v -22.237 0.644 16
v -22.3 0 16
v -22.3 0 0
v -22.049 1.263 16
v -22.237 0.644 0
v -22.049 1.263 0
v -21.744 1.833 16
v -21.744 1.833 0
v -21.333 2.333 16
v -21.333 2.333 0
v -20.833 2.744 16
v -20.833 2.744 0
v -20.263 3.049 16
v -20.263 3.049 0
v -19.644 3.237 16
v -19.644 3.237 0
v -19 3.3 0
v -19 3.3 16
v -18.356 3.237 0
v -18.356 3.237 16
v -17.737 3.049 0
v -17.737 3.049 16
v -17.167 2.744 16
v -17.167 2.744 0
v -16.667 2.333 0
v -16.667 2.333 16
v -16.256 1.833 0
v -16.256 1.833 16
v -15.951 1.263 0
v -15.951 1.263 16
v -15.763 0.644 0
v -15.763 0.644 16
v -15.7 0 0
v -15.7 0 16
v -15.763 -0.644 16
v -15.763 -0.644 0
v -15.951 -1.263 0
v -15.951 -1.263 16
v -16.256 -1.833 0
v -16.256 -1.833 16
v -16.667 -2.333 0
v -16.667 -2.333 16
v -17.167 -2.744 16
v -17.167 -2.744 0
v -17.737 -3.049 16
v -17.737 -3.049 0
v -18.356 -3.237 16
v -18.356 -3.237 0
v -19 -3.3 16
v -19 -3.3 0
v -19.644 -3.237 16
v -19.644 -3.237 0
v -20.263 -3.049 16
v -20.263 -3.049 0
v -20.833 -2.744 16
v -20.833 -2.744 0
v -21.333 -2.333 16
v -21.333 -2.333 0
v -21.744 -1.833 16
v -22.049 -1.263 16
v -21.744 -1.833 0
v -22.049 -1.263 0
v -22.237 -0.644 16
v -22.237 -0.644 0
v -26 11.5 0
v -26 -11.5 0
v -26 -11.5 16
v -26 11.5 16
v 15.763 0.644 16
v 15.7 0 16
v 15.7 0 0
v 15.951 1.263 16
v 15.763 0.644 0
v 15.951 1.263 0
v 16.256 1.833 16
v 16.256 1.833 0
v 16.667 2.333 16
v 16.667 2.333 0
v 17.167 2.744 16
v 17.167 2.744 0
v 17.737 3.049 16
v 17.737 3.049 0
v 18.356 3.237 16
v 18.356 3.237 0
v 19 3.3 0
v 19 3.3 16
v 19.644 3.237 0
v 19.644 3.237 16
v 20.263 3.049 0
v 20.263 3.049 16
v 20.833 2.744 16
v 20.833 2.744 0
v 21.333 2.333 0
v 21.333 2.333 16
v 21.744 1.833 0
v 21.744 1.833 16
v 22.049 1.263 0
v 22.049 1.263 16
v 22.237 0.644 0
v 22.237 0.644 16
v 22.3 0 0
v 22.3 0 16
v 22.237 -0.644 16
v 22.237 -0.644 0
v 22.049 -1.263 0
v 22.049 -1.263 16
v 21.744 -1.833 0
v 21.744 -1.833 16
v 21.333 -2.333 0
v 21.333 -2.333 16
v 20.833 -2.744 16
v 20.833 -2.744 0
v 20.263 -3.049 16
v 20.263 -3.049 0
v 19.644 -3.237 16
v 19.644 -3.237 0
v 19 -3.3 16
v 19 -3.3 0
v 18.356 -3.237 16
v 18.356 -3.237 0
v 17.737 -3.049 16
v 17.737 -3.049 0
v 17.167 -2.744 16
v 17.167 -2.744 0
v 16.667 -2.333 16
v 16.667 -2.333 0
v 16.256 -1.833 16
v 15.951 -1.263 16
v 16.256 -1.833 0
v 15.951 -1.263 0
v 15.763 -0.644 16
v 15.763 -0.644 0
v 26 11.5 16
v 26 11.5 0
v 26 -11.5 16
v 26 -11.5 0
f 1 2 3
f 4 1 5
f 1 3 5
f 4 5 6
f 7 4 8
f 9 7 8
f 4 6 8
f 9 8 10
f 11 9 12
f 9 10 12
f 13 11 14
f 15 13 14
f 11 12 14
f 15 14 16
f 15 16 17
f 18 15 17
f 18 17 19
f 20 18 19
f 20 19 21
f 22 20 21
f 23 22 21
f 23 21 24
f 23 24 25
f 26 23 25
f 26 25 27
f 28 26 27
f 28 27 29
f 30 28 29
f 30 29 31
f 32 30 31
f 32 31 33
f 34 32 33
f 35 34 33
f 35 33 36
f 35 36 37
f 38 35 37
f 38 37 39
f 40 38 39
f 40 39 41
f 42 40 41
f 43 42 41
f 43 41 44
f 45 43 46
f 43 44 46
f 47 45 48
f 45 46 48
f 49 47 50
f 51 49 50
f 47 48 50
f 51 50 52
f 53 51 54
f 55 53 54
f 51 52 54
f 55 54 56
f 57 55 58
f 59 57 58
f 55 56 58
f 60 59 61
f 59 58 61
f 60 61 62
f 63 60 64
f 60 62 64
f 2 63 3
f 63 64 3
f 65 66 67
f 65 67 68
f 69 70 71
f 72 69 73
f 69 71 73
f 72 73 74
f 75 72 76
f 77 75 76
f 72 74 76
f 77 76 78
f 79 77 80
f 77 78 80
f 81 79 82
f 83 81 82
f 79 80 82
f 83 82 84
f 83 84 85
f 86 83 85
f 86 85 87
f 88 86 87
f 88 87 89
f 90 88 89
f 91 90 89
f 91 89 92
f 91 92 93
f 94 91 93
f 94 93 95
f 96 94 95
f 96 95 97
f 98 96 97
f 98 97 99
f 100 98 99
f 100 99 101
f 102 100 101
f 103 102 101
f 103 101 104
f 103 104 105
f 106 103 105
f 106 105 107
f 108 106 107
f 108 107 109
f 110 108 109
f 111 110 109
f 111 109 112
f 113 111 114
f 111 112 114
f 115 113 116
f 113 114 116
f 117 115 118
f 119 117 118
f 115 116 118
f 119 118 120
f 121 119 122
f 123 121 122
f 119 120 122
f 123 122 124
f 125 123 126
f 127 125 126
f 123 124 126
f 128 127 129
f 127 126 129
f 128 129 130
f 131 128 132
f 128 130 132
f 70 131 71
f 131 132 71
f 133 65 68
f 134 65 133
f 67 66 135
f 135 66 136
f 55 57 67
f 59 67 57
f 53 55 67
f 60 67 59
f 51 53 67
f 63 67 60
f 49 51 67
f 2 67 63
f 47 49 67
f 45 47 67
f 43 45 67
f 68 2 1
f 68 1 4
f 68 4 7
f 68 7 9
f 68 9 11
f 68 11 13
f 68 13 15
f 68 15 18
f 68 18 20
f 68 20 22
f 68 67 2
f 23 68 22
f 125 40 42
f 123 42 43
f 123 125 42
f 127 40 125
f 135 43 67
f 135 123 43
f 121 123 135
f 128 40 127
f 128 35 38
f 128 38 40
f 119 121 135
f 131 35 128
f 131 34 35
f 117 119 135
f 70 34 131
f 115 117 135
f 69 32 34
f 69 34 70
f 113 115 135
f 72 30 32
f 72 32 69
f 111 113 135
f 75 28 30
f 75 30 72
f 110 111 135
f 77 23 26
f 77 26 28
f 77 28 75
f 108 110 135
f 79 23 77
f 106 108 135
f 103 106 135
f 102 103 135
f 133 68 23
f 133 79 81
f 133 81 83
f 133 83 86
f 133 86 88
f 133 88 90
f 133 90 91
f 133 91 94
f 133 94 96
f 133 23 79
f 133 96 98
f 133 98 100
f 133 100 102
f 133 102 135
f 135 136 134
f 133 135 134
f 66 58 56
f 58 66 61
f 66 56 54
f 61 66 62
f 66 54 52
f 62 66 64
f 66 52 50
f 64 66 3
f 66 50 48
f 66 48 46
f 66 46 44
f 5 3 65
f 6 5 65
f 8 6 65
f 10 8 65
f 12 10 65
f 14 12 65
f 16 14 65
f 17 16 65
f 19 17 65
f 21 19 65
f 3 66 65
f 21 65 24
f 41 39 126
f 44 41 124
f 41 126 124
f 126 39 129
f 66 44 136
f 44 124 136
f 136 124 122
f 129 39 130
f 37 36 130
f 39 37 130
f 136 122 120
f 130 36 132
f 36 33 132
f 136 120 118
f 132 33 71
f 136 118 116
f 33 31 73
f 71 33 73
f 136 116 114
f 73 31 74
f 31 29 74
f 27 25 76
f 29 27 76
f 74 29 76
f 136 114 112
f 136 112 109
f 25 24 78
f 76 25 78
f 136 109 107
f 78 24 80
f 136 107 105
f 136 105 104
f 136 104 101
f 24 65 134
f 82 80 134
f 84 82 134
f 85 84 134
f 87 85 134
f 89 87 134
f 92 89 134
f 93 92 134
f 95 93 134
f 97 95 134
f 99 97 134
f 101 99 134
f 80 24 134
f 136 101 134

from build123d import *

# Parameters (mm, degrees)
SKETCH_1_W                  = 52
SKETCH_1_H                  = 23
EXTRUDE_1_DEPTH             = 16
HOLE_WIZARD_6_6_6_6_1_D     = 6.6
HOLE_WIZARD_6_6_6_6_1_DEPTH = 16


with BuildPart() as part:
    # 草图1 → 凸台-拉伸1 (new body)
    with BuildSketch(Plane.XY):
        Rectangle(SKETCH_1_W, SKETCH_1_H)
    extrude(amount=EXTRUDE_1_DEPTH)

    # Ø6.6 (6.6) 直径孔1
    with Locations(Plane.XY.offset(16)):
        with Locations((-19, 0), (19, 0)):
            Hole(HOLE_WIZARD_6_6_6_6_1_D / 2, depth=HOLE_WIZARD_6_6_6_6_1_DEPTH)


solid = part.part
